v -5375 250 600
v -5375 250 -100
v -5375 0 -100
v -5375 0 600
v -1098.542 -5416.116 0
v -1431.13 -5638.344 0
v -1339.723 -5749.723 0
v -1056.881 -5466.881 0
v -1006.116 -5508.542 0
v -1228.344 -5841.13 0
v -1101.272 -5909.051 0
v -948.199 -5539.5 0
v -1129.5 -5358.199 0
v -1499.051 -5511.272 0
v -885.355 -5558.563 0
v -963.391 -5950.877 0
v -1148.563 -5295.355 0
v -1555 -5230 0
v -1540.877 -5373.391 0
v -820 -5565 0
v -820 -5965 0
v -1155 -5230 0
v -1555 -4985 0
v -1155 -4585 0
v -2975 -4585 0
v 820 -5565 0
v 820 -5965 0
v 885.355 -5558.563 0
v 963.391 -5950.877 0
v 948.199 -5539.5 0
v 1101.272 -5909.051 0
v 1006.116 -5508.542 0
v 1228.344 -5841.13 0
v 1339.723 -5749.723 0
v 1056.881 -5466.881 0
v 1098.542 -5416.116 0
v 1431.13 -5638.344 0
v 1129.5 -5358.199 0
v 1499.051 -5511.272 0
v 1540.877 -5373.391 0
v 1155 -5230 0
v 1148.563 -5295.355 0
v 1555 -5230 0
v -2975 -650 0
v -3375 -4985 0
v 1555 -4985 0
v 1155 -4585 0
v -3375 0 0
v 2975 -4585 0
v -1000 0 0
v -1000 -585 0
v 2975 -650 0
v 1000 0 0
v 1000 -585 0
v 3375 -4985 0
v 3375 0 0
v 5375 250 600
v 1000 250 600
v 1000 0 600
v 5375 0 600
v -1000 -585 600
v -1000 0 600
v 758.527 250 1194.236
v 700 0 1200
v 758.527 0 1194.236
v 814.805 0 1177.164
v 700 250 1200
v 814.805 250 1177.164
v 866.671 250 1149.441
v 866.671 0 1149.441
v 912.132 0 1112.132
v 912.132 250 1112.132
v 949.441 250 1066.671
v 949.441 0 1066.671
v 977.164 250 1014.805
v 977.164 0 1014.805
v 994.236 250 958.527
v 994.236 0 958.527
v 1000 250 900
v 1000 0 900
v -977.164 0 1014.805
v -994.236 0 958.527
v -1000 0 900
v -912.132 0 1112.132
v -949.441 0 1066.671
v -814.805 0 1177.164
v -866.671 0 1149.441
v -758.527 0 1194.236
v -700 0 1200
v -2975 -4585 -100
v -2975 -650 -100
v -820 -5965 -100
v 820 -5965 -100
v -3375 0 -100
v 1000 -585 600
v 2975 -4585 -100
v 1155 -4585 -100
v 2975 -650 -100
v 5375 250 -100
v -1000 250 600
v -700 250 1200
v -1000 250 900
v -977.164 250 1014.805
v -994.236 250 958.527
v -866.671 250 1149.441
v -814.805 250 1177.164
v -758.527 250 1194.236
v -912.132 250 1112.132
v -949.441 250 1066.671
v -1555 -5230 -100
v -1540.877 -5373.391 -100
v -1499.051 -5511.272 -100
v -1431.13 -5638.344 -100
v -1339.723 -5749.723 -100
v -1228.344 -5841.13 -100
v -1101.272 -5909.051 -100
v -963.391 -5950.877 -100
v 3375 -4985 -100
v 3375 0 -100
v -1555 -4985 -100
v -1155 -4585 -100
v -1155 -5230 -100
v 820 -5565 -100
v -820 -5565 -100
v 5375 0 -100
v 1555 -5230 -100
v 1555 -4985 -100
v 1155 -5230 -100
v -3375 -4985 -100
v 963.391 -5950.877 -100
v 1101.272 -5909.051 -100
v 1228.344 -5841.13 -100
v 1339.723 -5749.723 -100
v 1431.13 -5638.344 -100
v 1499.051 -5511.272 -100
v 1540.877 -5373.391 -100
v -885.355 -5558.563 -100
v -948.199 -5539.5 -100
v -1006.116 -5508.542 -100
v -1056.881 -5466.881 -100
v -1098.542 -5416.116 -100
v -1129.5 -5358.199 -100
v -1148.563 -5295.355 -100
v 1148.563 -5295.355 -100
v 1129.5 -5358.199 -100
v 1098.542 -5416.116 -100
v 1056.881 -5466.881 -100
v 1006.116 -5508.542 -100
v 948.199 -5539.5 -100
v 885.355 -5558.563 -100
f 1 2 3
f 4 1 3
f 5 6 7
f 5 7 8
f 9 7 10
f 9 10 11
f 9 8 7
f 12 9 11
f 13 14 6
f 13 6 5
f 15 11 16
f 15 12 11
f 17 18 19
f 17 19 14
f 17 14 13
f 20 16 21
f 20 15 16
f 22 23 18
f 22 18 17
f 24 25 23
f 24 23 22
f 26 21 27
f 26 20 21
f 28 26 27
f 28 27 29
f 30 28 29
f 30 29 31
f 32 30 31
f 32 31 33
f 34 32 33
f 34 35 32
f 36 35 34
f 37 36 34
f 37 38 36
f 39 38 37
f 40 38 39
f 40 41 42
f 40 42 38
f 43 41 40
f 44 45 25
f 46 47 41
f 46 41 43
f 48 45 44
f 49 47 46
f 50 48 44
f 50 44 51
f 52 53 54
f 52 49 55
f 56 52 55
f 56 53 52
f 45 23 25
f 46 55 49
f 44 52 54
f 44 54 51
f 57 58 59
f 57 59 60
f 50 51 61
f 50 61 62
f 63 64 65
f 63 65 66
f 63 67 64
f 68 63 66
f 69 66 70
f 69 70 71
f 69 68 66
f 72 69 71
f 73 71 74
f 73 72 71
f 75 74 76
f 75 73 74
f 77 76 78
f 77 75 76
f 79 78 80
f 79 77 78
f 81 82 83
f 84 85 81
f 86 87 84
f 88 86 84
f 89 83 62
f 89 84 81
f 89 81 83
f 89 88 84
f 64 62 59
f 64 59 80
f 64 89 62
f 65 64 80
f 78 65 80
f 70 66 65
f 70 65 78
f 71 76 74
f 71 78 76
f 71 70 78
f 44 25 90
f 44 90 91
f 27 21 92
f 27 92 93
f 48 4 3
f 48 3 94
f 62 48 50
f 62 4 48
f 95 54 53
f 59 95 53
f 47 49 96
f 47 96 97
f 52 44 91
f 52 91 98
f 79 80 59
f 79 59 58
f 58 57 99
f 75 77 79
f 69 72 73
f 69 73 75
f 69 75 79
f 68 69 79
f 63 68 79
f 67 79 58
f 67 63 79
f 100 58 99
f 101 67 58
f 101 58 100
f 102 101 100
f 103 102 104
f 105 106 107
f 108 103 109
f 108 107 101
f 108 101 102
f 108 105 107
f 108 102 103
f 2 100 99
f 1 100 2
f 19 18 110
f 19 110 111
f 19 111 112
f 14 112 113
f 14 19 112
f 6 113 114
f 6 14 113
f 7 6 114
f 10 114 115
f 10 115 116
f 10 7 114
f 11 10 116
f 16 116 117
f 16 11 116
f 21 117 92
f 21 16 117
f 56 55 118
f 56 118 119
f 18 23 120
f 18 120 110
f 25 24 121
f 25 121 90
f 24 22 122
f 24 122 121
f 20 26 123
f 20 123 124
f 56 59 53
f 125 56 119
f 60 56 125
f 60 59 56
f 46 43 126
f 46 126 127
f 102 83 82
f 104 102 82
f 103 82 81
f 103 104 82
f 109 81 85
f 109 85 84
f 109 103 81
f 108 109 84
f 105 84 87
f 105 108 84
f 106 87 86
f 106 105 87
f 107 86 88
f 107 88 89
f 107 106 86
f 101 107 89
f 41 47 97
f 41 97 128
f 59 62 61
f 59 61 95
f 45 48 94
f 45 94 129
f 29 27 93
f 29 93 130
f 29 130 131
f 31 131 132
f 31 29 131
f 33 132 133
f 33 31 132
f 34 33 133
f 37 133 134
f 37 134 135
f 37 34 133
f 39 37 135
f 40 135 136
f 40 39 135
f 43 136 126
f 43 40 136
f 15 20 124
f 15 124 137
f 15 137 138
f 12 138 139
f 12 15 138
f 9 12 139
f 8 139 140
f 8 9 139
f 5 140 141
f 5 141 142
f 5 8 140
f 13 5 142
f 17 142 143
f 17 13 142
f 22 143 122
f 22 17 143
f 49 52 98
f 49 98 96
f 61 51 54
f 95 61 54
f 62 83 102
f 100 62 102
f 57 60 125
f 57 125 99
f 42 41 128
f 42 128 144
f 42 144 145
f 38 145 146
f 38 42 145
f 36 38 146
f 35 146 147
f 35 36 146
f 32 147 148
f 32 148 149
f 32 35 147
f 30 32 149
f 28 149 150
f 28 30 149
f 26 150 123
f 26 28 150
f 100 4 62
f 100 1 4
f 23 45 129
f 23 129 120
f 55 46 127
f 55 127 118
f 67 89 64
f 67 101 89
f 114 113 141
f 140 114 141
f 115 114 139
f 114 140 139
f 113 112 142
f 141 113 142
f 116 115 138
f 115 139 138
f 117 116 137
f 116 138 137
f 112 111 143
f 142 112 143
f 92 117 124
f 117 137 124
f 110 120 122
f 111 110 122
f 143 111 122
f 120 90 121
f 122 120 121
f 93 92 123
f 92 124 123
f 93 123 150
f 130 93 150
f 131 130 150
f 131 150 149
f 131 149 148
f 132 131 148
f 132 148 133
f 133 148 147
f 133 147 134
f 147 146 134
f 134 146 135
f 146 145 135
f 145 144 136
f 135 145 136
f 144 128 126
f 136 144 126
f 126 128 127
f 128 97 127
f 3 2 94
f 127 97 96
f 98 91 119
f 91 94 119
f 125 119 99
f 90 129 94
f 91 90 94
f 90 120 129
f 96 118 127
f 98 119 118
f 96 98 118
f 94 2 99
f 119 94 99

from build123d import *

# Parameters (mm, degrees)
F1_DEPTH      = 100
F0_W          = 2000
F0_H          = 250
F2_DEPTH      = 1200
F2_DEPTH_BACK = 100
F3_DEPTH      = 600
F3_DEPTH_BACK = 100
F0_H_2        = 585
F4_DEPTH      = 600
F4_DEPTH_BACK = 100
F5_R          = 300


with BuildPart() as f1:
    # F0 (on Top) → F1 (new body)
    with BuildSketch(Plane.XY):
        with BuildLine():
            Line((-1000, 0), (-3375, 0))
            Line((-3375, 0), (-3375, -4985))
            Line((-3375, -4985), (-1555, -4985))
            Line((-1555, -4985), (-1555, -5230))
            ThreePointArc((-1555, -5230), (-1339.7234841721, -5749.7234841721), (-820, -5965))
            Line((-820, -5965), (820, -5965))
            ThreePointArc((820, -5965), (1339.7234841721, -5749.7234841721), (1555, -5230))
            Line((1555, -5230), (1555, -4985))
            Line((1555, -4985), (3375, -4985))
            Line((3375, -4985), (3375, 0))
            Line((3375, 0), (1000, 0))
            Line((1000, 0), (1000, -585))
            Line((1000, -585), (-1000, -585))
            Line((-1000, -585), (-1000, 0))
        make_face()
        with BuildLine():
            Line((-2975, -4585), (-2975, -650))
            Line((-2975, -650), (2975, -650))
            Line((2975, -650), (2975, -4585))
            Line((2975, -4585), (1155, -4585))
            Line((1155, -4585), (1155, -5230))
            ThreePointArc((1155, -5230), (1056.8807716975, -5466.8807716975), (820, -5565))
            Line((820, -5565), (-820, -5565))
            ThreePointArc((-820, -5565), (-1056.8807716975, -5466.8807716975), (-1155, -5230))
            Line((-1155, -5230), (-1155, -4585))
            Line((-1155, -4585), (-2975, -4585))
        make_face(mode=Mode.SUBTRACT)
    extrude(amount=-F1_DEPTH)

    # F0 (on Top) → F2 (join, two sides)
    with BuildSketch(Plane.XY) as f2_sk:
        with Locations((0, 125)):
            Rectangle(F0_W, F0_H)
    extrude(amount=F2_DEPTH)
    extrude(f2_sk.sketch, amount=-F2_DEPTH_BACK)

    # F0 (on Top) → F3 (join, two sides)
    with BuildSketch(Plane.XY) as f3_sk:
        Polygon((-5375, 0), (-3375, 0), (-1000, 0), (-1000, 250), (-5375, 250), align=None)
        Polygon((1000, 250), (1000, 0), (3375, 0), (5375, 0), (5375, 250), align=None)
    extrude(amount=F3_DEPTH)
    extrude(f3_sk.sketch, amount=-F3_DEPTH_BACK)

    # F0 (on Top) → F4 (join, two sides)
    with BuildSketch(Plane.XY) as f4_sk:
        with Locations((0, -292.5)):
            Rectangle(F0_W, F0_H_2)
    extrude(amount=F4_DEPTH)
    extrude(f4_sk.sketch, amount=-F4_DEPTH_BACK)

    # F5
    f5_edges = [f1.edges().sort_by_distance(p)[0] for p in [
        (-1000, 125, 1200),
        (1000, 125, 1200),
    ]]
    fillet(f5_edges, radius=F5_R)


solid = f1.part
